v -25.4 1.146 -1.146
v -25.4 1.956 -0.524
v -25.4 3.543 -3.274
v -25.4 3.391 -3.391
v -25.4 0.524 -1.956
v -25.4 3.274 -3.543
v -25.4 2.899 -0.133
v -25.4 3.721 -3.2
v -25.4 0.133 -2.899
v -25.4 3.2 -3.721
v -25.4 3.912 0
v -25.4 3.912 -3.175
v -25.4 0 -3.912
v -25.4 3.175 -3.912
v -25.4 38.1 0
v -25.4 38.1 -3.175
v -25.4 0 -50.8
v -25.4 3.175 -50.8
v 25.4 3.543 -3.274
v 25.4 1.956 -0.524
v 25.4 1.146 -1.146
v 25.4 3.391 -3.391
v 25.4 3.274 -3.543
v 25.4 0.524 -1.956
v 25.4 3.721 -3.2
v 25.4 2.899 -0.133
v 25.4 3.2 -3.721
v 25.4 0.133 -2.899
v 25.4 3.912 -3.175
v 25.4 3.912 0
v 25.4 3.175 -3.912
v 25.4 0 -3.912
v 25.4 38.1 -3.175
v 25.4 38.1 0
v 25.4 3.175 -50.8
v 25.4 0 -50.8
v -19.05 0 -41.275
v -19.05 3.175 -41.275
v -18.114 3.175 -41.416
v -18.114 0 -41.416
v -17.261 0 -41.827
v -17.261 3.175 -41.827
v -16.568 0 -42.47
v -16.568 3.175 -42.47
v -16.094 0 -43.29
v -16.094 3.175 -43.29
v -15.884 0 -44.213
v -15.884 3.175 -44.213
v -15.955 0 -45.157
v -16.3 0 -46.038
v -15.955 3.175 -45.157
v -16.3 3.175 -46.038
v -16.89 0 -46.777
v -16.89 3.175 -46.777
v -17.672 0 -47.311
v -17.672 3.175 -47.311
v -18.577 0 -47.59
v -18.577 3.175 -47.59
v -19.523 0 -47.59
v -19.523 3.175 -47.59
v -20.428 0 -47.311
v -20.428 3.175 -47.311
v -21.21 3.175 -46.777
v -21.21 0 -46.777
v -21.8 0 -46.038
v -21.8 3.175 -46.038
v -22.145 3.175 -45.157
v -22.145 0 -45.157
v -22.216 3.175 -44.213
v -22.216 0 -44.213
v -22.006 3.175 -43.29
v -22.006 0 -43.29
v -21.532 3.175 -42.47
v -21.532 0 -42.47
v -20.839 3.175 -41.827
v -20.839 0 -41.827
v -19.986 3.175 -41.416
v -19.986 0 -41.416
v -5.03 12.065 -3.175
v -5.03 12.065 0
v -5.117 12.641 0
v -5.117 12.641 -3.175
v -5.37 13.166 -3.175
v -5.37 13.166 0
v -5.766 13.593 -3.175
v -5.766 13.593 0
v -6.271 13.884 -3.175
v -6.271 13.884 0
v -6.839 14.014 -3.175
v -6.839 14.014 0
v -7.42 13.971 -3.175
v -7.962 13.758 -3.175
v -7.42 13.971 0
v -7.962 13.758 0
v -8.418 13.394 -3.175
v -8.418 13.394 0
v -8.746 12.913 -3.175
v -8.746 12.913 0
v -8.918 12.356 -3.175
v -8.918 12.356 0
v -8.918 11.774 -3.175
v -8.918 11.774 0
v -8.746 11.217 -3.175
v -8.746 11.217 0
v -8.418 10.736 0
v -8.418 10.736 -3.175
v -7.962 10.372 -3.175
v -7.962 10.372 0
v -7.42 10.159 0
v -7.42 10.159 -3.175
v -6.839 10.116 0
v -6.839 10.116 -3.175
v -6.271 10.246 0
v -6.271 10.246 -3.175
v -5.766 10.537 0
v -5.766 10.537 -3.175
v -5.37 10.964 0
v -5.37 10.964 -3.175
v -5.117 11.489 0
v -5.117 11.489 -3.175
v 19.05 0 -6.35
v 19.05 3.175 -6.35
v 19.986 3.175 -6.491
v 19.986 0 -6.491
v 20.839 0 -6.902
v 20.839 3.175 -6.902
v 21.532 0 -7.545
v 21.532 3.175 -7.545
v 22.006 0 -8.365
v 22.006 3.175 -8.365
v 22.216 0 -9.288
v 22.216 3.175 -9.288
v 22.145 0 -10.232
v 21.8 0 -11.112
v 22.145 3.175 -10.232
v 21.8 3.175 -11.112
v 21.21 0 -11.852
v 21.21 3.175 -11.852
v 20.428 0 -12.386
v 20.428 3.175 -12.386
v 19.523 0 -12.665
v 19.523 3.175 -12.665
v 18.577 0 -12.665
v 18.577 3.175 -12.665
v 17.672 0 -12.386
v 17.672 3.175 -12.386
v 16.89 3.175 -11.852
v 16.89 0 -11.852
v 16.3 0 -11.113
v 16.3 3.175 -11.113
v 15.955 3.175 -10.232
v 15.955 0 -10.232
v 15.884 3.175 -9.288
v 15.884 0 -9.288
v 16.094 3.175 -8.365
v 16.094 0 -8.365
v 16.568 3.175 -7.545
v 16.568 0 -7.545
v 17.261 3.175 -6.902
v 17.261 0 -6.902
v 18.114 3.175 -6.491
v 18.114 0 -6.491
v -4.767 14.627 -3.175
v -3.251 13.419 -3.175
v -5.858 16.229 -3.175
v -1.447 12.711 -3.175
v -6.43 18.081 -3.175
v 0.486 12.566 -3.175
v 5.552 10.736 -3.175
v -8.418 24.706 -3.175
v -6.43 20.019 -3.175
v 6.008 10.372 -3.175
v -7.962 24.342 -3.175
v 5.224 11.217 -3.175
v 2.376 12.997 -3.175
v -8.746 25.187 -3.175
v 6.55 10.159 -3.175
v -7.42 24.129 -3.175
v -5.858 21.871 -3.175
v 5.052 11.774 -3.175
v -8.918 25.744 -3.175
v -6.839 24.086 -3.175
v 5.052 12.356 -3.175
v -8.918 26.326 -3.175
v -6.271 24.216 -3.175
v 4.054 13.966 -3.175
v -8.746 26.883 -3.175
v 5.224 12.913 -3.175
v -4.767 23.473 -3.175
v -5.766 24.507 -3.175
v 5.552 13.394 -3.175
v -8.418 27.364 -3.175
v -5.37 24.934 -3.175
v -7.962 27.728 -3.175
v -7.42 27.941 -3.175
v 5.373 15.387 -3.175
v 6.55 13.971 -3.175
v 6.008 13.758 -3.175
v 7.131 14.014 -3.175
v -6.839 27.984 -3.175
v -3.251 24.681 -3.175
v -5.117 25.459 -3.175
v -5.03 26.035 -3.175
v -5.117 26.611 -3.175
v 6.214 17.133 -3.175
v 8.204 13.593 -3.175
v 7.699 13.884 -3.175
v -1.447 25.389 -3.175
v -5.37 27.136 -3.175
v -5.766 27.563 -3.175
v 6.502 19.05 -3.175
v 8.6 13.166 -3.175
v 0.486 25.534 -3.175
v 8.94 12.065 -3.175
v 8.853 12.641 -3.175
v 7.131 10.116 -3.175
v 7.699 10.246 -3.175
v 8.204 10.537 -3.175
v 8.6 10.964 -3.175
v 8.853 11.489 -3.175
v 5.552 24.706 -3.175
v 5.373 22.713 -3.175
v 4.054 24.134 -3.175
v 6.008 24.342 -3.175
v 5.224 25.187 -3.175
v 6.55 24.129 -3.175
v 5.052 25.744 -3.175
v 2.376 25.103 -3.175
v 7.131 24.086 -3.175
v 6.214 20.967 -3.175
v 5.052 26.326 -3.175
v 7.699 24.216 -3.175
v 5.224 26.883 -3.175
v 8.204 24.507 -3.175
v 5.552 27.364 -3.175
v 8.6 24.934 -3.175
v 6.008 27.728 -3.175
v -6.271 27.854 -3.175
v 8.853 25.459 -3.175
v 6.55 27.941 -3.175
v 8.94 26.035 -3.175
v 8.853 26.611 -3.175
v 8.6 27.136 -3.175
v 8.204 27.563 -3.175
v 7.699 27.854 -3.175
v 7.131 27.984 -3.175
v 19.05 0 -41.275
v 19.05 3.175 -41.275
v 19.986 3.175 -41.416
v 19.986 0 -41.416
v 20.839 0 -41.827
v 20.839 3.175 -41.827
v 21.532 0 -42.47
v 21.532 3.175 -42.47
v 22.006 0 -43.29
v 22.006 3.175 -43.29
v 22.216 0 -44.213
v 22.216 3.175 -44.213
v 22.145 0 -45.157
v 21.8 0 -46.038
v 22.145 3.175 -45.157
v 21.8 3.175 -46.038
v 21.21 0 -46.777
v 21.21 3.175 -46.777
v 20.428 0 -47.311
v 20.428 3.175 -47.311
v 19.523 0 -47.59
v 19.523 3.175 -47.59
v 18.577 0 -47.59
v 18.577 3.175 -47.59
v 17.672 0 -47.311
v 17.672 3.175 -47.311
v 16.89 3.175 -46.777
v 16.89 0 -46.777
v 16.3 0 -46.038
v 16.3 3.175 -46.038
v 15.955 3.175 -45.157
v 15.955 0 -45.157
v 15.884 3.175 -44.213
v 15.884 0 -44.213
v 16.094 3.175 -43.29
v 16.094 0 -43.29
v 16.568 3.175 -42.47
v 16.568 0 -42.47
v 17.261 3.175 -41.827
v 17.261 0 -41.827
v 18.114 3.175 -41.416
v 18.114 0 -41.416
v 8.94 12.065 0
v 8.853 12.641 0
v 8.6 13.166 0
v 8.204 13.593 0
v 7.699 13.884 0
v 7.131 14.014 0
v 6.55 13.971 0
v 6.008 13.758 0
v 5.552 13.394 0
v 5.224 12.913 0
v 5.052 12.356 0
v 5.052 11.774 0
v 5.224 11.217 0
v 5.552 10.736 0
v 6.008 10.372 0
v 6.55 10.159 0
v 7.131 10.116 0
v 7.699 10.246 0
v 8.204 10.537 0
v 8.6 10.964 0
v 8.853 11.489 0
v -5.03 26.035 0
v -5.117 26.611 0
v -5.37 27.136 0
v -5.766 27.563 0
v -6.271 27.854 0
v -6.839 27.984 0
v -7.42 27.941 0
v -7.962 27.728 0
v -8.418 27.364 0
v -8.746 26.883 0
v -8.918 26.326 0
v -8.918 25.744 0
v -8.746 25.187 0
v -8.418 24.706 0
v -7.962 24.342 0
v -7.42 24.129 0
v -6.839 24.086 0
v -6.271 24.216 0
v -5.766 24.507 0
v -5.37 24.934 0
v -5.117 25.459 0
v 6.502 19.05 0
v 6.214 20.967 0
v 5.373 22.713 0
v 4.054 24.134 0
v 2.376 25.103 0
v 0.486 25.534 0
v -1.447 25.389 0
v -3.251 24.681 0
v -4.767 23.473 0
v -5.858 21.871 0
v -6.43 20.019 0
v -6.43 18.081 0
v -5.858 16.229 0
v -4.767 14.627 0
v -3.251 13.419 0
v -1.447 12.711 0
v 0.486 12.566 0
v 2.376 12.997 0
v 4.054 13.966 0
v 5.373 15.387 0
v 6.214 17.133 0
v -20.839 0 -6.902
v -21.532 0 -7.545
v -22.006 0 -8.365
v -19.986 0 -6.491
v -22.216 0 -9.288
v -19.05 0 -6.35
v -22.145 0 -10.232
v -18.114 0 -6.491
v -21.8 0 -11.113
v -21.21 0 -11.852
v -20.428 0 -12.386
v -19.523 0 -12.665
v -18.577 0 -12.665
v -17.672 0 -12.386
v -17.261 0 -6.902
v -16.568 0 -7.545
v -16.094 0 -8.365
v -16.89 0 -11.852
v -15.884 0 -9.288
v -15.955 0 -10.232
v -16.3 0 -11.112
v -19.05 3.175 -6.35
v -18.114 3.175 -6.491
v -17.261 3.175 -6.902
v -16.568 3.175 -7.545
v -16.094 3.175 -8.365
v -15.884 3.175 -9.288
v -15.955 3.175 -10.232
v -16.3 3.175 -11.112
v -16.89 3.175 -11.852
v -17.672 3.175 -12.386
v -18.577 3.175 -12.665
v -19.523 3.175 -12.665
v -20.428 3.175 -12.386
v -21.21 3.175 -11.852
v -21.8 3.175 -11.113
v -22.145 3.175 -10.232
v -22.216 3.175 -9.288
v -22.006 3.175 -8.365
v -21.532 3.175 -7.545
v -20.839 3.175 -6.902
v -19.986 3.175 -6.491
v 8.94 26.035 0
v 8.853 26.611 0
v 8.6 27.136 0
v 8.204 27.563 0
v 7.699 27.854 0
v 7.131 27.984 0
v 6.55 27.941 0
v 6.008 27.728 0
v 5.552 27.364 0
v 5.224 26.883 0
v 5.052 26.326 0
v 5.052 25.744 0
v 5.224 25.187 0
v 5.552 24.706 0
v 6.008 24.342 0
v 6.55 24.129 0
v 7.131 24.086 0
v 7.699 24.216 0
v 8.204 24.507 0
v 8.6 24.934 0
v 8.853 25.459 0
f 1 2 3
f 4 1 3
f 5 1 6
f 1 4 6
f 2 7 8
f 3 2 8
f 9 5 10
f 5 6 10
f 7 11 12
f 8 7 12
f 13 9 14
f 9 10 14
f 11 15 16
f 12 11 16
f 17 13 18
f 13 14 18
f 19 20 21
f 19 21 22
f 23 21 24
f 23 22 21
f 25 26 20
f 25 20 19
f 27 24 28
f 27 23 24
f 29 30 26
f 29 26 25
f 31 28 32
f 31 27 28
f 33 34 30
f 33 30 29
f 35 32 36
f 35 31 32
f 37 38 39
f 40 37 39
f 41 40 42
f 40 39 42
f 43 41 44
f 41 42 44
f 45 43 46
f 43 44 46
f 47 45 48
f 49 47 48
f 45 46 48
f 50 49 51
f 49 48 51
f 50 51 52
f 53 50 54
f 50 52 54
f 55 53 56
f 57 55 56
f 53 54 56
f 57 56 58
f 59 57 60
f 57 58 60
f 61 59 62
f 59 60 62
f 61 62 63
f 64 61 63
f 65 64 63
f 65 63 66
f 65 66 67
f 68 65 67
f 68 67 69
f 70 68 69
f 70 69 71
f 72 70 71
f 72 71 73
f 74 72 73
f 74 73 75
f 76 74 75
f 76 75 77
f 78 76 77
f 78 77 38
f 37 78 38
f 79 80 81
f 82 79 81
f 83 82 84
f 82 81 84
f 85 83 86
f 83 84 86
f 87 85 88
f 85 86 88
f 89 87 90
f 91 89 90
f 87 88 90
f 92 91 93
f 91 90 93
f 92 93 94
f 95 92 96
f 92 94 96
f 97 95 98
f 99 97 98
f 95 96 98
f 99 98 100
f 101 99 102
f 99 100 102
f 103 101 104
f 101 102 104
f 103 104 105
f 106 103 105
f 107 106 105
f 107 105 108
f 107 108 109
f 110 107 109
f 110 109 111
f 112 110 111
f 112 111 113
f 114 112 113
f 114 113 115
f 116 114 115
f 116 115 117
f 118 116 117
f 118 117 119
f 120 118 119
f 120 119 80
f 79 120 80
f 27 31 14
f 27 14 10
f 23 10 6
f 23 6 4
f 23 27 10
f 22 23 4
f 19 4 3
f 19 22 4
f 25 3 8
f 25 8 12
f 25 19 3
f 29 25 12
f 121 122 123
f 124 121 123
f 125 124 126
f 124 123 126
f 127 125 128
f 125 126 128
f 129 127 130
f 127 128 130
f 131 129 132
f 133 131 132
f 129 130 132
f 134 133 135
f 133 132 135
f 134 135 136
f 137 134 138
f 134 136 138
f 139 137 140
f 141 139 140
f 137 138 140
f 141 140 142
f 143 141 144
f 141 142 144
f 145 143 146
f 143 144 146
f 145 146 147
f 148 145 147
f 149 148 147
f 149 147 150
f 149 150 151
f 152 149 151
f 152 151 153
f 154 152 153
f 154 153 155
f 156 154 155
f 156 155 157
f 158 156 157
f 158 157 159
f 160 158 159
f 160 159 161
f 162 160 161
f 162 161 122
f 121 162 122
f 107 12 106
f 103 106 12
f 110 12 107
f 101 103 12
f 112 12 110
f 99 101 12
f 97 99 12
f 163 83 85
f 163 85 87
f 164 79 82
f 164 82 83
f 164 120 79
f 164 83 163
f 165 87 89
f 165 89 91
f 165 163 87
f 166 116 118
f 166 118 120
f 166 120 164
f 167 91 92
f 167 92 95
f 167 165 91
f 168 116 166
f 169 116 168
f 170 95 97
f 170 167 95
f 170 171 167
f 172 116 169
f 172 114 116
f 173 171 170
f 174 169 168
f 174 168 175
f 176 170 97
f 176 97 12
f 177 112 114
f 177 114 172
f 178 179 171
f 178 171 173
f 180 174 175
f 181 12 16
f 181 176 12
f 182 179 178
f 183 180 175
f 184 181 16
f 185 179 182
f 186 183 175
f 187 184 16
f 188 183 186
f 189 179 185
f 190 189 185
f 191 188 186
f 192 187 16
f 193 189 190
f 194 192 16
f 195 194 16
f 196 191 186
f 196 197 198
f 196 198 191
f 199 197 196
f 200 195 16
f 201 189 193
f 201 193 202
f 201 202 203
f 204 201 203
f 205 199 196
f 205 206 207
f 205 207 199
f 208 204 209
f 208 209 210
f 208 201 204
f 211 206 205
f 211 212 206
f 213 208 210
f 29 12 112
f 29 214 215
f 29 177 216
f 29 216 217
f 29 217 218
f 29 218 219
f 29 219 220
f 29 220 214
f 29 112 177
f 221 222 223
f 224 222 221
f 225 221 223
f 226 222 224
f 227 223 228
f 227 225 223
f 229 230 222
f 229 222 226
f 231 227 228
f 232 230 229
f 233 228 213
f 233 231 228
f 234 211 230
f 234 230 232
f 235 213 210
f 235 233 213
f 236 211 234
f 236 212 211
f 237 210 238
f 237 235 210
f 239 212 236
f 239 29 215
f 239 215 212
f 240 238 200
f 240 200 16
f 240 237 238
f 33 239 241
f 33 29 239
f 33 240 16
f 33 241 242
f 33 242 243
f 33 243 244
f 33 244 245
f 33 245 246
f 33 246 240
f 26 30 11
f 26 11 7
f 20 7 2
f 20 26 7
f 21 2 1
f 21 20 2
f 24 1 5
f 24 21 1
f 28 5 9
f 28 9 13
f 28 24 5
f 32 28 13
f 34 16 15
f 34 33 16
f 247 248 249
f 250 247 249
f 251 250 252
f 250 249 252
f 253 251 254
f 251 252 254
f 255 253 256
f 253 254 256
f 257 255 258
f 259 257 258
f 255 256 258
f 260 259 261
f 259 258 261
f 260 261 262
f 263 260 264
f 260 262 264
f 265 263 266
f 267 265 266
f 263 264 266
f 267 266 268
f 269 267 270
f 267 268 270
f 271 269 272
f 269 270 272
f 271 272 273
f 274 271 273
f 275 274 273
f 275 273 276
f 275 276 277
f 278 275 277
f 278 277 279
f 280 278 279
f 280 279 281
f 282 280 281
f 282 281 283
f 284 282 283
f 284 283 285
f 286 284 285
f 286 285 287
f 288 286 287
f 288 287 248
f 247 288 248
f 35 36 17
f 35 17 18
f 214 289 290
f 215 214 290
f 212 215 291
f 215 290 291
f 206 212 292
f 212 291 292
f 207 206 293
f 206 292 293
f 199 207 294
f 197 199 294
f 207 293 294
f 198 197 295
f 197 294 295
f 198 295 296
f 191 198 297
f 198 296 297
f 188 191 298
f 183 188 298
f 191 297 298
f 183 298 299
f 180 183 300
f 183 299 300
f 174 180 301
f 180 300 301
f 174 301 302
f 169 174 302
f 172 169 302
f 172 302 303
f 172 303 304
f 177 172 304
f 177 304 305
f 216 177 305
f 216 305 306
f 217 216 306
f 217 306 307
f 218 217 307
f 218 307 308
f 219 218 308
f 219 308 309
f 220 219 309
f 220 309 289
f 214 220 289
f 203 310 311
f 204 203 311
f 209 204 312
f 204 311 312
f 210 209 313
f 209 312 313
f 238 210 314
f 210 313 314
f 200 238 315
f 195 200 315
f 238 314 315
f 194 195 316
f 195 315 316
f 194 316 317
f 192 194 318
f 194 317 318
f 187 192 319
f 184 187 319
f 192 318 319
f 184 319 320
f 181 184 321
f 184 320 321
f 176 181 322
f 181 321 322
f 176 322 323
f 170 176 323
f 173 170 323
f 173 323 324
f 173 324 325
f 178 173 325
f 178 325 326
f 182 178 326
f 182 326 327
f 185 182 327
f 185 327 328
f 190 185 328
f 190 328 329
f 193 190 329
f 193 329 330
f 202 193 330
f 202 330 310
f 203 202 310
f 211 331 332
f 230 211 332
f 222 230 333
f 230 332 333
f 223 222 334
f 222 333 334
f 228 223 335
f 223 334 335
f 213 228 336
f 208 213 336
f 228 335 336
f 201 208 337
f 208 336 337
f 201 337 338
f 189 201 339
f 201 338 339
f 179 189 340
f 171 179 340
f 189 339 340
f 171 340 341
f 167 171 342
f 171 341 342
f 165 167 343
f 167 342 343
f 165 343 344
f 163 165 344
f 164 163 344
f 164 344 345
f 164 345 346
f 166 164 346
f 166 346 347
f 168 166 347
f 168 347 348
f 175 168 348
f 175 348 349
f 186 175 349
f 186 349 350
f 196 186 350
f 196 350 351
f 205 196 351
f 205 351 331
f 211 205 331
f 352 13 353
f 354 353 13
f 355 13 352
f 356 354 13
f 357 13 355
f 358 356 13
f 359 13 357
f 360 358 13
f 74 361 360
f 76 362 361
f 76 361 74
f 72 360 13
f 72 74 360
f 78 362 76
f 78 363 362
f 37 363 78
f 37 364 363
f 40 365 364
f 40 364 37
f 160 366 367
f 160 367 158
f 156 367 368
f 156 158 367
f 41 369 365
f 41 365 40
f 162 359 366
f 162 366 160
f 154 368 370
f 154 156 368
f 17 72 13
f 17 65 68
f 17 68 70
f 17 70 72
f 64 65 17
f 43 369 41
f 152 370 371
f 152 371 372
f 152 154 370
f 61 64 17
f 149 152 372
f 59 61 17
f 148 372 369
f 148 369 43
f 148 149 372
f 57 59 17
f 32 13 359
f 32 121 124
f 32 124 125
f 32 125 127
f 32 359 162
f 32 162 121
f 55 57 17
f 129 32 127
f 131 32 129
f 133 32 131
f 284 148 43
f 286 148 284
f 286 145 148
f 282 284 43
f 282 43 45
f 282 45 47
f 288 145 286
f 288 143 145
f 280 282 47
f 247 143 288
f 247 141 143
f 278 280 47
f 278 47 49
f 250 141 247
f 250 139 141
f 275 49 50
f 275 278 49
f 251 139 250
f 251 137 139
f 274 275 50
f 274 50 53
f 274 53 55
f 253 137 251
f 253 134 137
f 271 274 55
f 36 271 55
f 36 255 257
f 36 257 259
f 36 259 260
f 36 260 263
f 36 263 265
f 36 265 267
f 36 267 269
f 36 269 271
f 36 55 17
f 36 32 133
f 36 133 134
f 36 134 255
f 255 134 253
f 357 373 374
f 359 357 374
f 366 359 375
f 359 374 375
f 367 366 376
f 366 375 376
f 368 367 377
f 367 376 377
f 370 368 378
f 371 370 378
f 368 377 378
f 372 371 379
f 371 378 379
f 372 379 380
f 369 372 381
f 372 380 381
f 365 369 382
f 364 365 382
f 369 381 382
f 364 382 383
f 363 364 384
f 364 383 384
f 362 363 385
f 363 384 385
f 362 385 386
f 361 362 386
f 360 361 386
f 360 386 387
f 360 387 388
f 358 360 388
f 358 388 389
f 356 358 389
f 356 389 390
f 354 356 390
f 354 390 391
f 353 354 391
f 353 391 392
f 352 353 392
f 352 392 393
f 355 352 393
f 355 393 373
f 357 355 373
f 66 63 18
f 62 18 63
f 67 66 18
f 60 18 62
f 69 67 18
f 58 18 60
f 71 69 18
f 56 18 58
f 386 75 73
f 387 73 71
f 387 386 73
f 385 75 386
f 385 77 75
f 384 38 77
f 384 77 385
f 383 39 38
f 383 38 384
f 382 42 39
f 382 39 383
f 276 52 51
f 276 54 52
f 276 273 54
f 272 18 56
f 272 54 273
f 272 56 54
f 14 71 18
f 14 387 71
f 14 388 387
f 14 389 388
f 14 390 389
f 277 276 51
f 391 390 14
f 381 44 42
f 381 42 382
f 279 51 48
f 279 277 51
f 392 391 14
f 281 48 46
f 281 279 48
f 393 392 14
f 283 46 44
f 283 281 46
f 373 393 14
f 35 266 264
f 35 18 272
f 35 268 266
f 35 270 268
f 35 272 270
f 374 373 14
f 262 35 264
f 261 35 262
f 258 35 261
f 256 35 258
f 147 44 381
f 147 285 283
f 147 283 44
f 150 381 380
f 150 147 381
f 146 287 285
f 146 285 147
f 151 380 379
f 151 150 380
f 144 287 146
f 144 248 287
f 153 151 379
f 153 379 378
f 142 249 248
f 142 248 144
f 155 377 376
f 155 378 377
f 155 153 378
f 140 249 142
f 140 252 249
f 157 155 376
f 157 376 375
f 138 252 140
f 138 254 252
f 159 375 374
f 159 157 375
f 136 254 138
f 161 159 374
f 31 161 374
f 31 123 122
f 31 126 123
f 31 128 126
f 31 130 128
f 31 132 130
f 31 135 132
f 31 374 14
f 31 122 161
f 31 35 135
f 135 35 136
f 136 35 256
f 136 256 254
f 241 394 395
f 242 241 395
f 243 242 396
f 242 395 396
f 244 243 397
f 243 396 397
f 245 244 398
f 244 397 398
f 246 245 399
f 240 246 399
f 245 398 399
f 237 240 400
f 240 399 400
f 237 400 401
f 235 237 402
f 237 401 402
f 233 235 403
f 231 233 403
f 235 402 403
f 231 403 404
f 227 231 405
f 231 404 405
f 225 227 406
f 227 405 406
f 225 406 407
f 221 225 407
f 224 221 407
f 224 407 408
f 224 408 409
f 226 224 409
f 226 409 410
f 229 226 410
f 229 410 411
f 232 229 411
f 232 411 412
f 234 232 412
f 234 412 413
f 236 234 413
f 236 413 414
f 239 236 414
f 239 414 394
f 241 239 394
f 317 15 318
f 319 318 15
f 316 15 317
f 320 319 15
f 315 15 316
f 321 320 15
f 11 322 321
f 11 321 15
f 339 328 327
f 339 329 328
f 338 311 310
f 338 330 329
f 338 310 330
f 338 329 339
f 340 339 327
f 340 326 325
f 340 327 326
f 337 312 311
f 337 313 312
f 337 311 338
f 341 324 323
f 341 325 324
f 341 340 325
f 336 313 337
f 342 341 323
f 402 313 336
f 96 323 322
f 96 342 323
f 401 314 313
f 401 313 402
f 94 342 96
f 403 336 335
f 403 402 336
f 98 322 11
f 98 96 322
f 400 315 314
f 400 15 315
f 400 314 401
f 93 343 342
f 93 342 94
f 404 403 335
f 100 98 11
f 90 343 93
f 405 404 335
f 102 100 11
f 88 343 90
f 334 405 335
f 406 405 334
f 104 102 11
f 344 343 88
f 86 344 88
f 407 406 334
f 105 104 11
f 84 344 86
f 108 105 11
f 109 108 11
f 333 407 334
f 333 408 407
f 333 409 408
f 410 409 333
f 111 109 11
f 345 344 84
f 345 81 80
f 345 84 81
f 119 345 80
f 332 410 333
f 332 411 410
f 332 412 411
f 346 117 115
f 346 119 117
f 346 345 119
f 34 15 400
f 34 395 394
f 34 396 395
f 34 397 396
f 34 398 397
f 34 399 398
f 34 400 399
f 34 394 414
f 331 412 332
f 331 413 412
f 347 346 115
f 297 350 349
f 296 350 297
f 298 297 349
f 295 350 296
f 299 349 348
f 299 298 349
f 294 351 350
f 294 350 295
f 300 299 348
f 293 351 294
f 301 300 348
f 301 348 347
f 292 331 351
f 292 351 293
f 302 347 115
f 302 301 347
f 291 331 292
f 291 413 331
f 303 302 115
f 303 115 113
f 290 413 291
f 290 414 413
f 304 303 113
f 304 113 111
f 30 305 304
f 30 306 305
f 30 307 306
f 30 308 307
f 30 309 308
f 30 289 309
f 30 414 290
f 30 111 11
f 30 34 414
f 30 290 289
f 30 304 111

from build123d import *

# Parameters (mm, degrees)
BASE_FLANGE1_DEPTH = 25.4
SKETCH6_R          = 6.5024
SKETCH6_R_2        = 1.95453
CUT_EXTRUDE1_DEPTH = 69.391593051
SKETCH7_R          = 3.175
CUT_EXTRUDE2_DEPTH = 67.675


# Sheet-metal steps are written as plain solids
with BuildPart() as part:
    # Sketch1 → Base-Flange1 (new, symmetric)
    with BuildSketch(Plane(origin=(0, 0, 0), x_dir=(0, 0, -1), z_dir=(1, 0, 0))):
        with BuildLine():
            Line((0, 38.1), (0, 3.9116))
            ThreePointArc((0, 3.9116), (1.145681115, 1.145681115), (3.9116, 0))
            Line((3.9116, 0), (50.8, 0))
            Line((50.8, 0), (50.8, 3.175))
            Line((50.8, 3.175), (3.9116, 3.175))
            ThreePointArc((3.9116, 3.175), (3.390745145, 3.390745145), (3.175, 3.9116))
            Line((3.175, 3.9116), (3.175, 38.1))
            Line((3.175, 38.1), (0, 38.1))
        make_face()
    extrude(amount=BASE_FLANGE1_DEPTH, both=True)

    # Sketch6 → Cut-Extrude1 (cut, through all)
    with BuildSketch(Plane.XY):
        with Locations((0, 19.05)):
            Circle(SKETCH6_R)
        with Locations((-6.985, 26.035)):
            Circle(SKETCH6_R_2)
        with Locations((6.985, 26.035)):
            Circle(SKETCH6_R_2)
        with Locations((6.985, 12.065)):
            Circle(SKETCH6_R_2)
        with Locations((-6.985, 12.065)):
            Circle(SKETCH6_R_2)
    extrude(amount=-CUT_EXTRUDE1_DEPTH, mode=Mode.SUBTRACT)

    # Sketch7 → Cut-Extrude2 (cut, through all)
    with BuildSketch(Plane(origin=(0, 3.175, 0), x_dir=(1, 0, 0), z_dir=(0, 1, 0))):
        with Locations(Location((-19.05, 44.45, 0), (0, 0, 270))):
            Circle(SKETCH7_R)
        with Locations(Location((-19.05, 9.525, 0), (0, 0, 270))):
            Circle(SKETCH7_R)
        with Locations(Location((19.05, 44.45, 0), (0, 0, 270))):
            Circle(SKETCH7_R)
        with Locations(Location((19.05, 9.525, 0), (0, 0, 270))):
            Circle(SKETCH7_R)
    extrude(amount=-CUT_EXTRUDE2_DEPTH, mode=Mode.SUBTRACT)


solid = part.part
